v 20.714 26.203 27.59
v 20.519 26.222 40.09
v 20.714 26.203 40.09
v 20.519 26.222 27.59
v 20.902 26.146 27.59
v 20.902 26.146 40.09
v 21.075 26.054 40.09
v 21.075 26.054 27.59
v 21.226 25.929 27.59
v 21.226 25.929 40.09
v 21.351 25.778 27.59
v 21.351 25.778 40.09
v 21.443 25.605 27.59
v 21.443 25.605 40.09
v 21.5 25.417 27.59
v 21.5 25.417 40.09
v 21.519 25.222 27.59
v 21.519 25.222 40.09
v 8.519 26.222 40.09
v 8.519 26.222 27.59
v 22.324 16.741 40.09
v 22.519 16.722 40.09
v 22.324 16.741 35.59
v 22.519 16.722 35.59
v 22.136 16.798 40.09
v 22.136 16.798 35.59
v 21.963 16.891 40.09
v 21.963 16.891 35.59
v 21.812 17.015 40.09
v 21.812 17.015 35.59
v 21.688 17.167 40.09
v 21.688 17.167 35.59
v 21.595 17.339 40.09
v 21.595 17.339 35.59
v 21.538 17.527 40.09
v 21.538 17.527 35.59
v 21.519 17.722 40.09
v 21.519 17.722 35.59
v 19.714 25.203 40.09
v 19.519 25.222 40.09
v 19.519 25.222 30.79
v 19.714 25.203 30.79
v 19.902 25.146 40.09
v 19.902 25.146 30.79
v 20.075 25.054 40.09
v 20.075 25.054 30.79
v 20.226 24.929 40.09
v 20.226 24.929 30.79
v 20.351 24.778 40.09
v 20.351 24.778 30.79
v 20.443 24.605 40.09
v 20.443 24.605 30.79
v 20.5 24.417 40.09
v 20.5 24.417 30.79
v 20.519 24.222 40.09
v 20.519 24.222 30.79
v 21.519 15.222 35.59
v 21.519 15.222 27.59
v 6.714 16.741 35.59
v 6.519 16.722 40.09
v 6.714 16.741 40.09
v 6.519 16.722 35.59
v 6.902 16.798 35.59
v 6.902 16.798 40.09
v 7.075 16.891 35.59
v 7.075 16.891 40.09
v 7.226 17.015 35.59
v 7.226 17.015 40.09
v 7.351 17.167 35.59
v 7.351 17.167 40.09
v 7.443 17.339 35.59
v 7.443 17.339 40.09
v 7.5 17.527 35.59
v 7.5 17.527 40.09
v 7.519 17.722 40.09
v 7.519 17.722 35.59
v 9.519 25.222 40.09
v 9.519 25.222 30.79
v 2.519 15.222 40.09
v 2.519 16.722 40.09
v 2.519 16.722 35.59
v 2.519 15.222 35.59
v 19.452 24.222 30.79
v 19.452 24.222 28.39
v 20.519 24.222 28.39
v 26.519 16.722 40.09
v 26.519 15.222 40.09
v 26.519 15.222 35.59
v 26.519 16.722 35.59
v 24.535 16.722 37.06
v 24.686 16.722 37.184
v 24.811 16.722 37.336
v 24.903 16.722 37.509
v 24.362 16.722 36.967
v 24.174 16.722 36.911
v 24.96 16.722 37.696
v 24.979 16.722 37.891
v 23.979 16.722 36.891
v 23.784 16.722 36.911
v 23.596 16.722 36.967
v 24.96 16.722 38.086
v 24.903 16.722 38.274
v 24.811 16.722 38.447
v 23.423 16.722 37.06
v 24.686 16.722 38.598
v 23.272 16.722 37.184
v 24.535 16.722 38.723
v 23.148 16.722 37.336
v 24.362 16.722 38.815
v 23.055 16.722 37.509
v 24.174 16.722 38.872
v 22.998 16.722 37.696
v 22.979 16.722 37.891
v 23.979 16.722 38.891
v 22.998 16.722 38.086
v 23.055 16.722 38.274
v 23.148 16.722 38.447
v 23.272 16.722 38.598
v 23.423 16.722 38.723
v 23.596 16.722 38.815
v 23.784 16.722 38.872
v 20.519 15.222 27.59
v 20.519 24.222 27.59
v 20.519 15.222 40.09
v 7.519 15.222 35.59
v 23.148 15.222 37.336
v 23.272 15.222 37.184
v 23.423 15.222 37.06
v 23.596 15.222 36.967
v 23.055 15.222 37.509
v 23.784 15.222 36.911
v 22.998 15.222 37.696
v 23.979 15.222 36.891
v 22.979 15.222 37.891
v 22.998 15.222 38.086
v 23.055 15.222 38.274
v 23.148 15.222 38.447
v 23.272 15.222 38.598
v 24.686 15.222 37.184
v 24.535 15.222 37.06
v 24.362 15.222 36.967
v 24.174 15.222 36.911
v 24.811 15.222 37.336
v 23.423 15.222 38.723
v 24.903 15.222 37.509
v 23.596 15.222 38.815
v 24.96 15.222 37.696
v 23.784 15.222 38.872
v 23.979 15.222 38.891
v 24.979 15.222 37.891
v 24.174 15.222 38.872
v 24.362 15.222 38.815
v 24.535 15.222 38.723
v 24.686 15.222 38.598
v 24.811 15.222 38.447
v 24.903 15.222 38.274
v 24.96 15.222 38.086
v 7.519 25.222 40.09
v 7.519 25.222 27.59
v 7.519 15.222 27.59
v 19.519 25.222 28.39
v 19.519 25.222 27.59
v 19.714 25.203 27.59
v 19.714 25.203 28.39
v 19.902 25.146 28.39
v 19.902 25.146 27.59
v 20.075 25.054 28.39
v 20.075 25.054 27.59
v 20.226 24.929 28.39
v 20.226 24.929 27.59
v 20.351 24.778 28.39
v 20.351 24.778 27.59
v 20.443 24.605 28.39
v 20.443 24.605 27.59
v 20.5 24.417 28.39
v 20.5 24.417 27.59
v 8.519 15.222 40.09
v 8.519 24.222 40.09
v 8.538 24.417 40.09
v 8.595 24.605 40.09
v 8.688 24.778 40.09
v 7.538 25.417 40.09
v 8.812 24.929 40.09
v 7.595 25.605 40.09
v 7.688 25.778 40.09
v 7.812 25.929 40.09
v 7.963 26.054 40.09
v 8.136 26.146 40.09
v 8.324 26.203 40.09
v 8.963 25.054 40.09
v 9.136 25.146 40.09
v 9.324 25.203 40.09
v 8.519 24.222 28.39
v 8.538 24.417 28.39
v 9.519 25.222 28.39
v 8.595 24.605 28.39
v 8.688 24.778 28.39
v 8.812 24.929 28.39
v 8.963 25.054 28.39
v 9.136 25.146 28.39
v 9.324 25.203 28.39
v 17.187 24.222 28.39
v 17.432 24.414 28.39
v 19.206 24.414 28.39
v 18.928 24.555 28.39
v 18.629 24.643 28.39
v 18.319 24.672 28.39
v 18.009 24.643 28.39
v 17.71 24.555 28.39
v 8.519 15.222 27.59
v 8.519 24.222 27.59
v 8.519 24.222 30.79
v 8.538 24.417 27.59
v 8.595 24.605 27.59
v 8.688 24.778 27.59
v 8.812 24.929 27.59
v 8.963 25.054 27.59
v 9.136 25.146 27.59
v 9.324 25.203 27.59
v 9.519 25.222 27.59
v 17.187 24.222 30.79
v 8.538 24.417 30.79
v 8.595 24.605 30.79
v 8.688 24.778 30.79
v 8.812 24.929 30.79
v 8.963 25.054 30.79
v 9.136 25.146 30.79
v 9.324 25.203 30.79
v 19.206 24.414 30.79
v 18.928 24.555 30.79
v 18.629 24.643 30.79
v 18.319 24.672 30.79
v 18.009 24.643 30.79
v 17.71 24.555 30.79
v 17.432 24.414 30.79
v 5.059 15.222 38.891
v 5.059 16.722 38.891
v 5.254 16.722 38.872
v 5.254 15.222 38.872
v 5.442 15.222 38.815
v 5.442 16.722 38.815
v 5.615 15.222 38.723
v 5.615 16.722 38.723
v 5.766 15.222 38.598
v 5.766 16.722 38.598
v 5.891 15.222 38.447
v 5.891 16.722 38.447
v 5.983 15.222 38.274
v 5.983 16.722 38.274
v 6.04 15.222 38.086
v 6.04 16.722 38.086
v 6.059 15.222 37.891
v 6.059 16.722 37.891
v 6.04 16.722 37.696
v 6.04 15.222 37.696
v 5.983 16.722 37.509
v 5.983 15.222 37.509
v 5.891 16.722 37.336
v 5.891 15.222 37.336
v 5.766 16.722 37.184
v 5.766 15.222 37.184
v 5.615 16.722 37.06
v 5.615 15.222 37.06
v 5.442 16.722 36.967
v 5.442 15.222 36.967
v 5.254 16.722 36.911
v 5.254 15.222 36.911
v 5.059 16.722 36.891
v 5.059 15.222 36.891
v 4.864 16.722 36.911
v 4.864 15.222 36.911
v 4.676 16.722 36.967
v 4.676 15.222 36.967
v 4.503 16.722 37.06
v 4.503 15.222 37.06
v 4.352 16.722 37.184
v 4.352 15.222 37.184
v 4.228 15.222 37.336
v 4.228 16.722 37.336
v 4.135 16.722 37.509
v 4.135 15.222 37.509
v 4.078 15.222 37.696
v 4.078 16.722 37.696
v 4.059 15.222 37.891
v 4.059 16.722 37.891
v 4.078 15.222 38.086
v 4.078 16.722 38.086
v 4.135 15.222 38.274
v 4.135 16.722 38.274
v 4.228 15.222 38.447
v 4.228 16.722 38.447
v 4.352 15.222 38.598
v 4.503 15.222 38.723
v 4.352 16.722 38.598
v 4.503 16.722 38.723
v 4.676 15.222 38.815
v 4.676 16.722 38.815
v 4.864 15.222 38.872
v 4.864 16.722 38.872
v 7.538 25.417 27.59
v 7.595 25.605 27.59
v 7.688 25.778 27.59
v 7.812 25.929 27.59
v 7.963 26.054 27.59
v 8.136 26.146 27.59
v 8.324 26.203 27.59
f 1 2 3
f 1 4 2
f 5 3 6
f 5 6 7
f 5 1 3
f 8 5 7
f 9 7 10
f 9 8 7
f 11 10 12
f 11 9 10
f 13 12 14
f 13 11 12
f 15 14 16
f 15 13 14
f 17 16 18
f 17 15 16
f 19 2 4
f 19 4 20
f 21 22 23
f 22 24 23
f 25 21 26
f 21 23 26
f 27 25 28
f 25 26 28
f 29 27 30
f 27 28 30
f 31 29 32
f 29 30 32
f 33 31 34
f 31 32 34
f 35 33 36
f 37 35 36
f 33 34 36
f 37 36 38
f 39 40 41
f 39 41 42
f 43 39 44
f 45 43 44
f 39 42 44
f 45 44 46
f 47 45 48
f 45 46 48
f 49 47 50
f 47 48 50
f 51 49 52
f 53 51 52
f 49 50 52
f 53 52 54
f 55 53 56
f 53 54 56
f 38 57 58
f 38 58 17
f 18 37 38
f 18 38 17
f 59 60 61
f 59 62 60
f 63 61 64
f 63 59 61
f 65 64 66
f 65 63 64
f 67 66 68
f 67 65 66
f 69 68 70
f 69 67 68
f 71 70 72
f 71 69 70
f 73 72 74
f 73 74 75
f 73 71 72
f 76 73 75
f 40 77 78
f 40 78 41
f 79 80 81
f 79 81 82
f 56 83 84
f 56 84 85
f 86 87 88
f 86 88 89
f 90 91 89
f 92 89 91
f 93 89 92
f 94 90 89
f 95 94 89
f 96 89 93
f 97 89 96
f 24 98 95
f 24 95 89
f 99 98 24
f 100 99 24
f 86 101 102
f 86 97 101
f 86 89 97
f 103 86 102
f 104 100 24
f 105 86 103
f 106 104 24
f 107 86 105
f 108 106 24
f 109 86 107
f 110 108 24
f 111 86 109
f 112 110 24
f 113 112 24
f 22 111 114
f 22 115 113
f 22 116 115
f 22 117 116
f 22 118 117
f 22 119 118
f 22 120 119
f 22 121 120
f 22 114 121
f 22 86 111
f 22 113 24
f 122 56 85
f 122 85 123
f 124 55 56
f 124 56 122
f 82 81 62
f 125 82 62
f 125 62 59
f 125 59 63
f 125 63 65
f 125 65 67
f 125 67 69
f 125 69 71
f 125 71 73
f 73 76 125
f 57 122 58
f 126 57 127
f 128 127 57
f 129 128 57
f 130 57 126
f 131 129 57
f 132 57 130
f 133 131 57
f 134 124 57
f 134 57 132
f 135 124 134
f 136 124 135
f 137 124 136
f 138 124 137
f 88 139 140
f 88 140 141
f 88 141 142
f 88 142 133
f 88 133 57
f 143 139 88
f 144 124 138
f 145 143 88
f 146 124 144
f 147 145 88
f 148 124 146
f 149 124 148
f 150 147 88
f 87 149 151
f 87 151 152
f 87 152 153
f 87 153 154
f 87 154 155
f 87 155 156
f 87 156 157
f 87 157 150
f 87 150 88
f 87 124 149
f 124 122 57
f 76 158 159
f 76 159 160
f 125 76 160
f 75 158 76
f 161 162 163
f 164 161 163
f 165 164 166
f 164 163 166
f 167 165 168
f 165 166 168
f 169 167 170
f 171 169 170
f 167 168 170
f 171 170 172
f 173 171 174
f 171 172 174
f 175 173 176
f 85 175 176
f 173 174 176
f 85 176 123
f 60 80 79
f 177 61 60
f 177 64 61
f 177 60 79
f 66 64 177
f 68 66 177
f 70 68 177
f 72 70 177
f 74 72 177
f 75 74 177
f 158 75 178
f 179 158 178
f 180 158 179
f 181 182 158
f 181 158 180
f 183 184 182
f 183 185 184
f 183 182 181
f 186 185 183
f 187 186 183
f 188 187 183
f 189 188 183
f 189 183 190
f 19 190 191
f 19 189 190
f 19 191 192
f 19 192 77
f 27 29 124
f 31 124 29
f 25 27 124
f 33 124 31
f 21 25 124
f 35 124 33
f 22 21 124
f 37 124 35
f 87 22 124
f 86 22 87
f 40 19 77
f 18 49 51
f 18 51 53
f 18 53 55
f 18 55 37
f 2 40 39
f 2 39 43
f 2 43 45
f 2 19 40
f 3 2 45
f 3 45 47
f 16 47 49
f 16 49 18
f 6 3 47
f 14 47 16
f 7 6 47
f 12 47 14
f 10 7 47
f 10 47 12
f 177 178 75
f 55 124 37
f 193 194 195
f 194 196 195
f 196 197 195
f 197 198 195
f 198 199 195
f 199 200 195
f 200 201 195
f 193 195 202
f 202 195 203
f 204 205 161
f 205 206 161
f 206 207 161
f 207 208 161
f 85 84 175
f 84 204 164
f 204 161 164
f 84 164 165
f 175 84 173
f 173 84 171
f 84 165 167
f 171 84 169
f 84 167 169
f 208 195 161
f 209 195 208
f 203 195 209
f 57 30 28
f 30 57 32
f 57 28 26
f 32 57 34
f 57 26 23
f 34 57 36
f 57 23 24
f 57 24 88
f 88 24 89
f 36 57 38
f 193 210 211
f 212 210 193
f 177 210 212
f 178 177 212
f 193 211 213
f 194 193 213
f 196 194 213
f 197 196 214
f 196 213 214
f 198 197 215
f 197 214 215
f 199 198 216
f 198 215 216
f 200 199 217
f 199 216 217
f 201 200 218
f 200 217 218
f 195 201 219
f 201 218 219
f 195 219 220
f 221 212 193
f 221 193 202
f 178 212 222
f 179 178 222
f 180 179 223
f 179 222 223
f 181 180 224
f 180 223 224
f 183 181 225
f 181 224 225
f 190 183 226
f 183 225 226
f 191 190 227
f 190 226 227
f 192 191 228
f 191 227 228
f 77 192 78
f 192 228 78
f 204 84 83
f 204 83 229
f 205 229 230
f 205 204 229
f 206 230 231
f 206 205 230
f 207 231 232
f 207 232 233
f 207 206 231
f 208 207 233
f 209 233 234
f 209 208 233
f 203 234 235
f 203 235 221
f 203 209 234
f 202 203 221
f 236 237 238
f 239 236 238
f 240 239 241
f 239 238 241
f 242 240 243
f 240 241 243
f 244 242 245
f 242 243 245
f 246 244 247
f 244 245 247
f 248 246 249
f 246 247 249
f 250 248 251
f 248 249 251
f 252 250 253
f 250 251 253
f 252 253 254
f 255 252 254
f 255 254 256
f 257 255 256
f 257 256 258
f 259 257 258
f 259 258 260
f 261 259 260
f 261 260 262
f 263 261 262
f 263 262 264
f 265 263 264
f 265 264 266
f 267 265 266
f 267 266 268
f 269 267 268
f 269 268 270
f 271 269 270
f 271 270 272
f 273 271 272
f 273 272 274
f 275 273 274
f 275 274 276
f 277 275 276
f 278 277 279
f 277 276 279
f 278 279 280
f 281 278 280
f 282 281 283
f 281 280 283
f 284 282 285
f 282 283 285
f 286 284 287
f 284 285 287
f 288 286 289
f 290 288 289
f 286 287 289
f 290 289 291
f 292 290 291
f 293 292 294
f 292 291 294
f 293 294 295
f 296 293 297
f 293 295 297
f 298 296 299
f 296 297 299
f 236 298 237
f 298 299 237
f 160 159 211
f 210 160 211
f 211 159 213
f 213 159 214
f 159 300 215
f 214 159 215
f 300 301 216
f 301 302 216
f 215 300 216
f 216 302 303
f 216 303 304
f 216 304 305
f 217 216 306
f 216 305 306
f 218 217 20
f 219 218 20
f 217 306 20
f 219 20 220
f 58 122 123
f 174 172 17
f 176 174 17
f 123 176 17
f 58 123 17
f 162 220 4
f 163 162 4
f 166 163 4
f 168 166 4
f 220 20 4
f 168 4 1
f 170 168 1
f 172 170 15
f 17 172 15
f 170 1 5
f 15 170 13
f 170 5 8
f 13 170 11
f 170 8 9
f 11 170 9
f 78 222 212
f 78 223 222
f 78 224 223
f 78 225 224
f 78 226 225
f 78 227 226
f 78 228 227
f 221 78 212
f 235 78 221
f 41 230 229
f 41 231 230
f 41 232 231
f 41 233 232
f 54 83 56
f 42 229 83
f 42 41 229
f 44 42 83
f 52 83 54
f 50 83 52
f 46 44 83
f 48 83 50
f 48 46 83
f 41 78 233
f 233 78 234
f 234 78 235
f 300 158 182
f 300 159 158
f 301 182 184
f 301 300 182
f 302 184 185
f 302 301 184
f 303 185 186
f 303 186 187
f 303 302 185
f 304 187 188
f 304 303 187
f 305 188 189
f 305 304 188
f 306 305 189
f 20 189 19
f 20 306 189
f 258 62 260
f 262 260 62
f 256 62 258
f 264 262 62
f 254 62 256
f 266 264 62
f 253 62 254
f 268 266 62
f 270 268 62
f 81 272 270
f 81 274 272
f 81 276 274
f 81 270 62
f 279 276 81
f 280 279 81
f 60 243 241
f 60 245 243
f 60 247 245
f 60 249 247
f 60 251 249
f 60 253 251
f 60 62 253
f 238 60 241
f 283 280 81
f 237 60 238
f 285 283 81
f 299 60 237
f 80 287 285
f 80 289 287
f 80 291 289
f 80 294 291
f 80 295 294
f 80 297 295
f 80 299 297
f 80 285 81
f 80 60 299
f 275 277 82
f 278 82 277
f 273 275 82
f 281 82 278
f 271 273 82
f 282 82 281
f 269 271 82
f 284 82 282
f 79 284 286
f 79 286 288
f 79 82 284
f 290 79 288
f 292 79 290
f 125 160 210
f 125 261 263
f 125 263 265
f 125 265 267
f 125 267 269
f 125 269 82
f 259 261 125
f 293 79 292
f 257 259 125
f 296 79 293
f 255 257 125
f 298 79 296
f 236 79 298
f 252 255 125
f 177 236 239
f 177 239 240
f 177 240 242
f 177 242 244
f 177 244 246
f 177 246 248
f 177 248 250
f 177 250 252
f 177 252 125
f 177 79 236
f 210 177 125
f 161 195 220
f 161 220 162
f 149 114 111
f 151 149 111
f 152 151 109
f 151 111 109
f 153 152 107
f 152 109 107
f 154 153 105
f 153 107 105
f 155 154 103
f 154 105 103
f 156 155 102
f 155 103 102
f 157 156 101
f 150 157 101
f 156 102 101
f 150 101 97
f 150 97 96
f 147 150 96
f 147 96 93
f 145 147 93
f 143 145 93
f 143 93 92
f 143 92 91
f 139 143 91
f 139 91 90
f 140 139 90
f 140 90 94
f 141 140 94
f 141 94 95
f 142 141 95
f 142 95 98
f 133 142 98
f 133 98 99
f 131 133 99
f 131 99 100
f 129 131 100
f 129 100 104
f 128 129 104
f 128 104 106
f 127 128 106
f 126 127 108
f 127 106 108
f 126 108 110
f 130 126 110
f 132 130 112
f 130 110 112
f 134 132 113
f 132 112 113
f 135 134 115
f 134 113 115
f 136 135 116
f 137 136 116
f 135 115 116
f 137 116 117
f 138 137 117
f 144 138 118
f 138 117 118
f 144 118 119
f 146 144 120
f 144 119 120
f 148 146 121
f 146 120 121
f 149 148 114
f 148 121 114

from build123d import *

# Parameters (mm, degrees)
BOSS_EXTRUDE1_DEPTH = 12.5
SKETCH3_R           = 1
CUT_EXTRUDE1_DEPTH  = 49.99745314
FILLET1_R           = 1
SKETCH4_W           = 12
SKETCH4_H           = 2.4
BOSS_EXTRUDE2_DEPTH = 1
CAVITY2_START       = 28.390407362
CAVITY2_DEPTH       = 2.4
FILLET2_R           = 1
SKETCH5_W           = 5
SKETCH5_H           = 8
CUT_EXTRUDE2_DEPTH  = 49.99745314
FILLET3_R           = 1


# Read off the part's stored shape, not the designer's step: Cavity2
with BuildPart() as part:
    # Sketch2 → Boss-Extrude1 (new body)
    with BuildSketch(Plane.XY.offset(40.090407362)):
        Polygon((8.51904319, 15.222118346), (8.51904319, 25.222118346), (20.51904319, 25.222118346), (20.51904319, 15.222118346), (21.51904319, 15.222118346), (26.51904319, 15.222118346), (26.51904319, 16.722118346), (21.51904319, 16.722118346), (21.51904319, 26.222118346), (7.51904319, 26.222118346), (7.51904319, 16.722118346), (2.51904319, 16.722118346), (2.51904319, 15.222118346), (7.51904319, 15.222118346), align=None)
    extrude(amount=-BOSS_EXTRUDE1_DEPTH)

    # Sketch3 → Cut-Extrude1 (cut, through all)
    with BuildSketch(Plane(origin=(0, 16.722118346, 0), x_dir=(1, 0, 0), z_dir=(0, 1, 0))):
        with Locations(Location((5.05904319, -37.891330821, 0), (0, 0, 270))):
            Circle(SKETCH3_R)
        with Locations(Location((23.97904319, -37.891330821, 0), (0, 0, 270))):
            Circle(SKETCH3_R)
    extrude(amount=-CUT_EXTRUDE1_DEPTH, mode=Mode.SUBTRACT)

    # Fillet1
    fillet1_edges = [part.edges().sort_by_distance(p)[0] for p in [
        (8.51904319, 25.222118346, 33.840407362),
        (20.51904319, 25.222118346, 33.840407362),
    ]]
    fillet(fillet1_edges, radius=FILLET1_R)

    # Sketch4 → Boss-Extrude2 (add)
    with BuildSketch(Plane.XZ.offset(-25.222118346)):
        with Locations((14.51904319, 29.590407362)):
            Rectangle(SKETCH4_W, SKETCH4_H)
    extrude(amount=BOSS_EXTRUDE2_DEPTH)

    # Cavity2 outline → Cavity2 (cut)
    with BuildSketch(Plane.XY.offset(CAVITY2_START)):
        with BuildLine():
            Line((17.186568025, 24.222118346), (19.451518355, 24.222118346))
            ThreePointArc((19.451518355, 24.222118346), (18.31904319, 24.672118346), (17.186568025, 24.222118346))
        make_face()
    extrude(amount=CAVITY2_DEPTH, mode=Mode.SUBTRACT)

    # Fillet2
    fillet2_edges = [part.edges().sort_by_distance(p)[0] for p in [
        (21.51904319, 26.222118346, 33.840407362),
        (7.51904319, 26.222118346, 33.840407362),
    ]]
    fillet(fillet2_edges, radius=FILLET2_R)

    # Sketch5 → Cut-Extrude2 (cut, through all)
    with BuildSketch(Plane(origin=(0, 16.722118346, 0), x_dir=(1, 0, 0), z_dir=(0, 1, 0))):
        with Locations((5.01904319, -31.590407362)):
            Rectangle(SKETCH5_W, SKETCH5_H)
        with Locations((24.01904319, -31.590407362)):
            Rectangle(SKETCH5_W, SKETCH5_H)
    extrude(amount=-CUT_EXTRUDE2_DEPTH, mode=Mode.SUBTRACT)

    # Fillet3
    fillet3_edges = [part.edges().sort_by_distance(p)[0] for p in [
        (21.51904319, 16.722118346, 37.840407362),
        (7.51904319, 16.722118346, 37.840407362),
    ]]
    fillet(fillet3_edges, radius=FILLET3_R)


solid = part.part
